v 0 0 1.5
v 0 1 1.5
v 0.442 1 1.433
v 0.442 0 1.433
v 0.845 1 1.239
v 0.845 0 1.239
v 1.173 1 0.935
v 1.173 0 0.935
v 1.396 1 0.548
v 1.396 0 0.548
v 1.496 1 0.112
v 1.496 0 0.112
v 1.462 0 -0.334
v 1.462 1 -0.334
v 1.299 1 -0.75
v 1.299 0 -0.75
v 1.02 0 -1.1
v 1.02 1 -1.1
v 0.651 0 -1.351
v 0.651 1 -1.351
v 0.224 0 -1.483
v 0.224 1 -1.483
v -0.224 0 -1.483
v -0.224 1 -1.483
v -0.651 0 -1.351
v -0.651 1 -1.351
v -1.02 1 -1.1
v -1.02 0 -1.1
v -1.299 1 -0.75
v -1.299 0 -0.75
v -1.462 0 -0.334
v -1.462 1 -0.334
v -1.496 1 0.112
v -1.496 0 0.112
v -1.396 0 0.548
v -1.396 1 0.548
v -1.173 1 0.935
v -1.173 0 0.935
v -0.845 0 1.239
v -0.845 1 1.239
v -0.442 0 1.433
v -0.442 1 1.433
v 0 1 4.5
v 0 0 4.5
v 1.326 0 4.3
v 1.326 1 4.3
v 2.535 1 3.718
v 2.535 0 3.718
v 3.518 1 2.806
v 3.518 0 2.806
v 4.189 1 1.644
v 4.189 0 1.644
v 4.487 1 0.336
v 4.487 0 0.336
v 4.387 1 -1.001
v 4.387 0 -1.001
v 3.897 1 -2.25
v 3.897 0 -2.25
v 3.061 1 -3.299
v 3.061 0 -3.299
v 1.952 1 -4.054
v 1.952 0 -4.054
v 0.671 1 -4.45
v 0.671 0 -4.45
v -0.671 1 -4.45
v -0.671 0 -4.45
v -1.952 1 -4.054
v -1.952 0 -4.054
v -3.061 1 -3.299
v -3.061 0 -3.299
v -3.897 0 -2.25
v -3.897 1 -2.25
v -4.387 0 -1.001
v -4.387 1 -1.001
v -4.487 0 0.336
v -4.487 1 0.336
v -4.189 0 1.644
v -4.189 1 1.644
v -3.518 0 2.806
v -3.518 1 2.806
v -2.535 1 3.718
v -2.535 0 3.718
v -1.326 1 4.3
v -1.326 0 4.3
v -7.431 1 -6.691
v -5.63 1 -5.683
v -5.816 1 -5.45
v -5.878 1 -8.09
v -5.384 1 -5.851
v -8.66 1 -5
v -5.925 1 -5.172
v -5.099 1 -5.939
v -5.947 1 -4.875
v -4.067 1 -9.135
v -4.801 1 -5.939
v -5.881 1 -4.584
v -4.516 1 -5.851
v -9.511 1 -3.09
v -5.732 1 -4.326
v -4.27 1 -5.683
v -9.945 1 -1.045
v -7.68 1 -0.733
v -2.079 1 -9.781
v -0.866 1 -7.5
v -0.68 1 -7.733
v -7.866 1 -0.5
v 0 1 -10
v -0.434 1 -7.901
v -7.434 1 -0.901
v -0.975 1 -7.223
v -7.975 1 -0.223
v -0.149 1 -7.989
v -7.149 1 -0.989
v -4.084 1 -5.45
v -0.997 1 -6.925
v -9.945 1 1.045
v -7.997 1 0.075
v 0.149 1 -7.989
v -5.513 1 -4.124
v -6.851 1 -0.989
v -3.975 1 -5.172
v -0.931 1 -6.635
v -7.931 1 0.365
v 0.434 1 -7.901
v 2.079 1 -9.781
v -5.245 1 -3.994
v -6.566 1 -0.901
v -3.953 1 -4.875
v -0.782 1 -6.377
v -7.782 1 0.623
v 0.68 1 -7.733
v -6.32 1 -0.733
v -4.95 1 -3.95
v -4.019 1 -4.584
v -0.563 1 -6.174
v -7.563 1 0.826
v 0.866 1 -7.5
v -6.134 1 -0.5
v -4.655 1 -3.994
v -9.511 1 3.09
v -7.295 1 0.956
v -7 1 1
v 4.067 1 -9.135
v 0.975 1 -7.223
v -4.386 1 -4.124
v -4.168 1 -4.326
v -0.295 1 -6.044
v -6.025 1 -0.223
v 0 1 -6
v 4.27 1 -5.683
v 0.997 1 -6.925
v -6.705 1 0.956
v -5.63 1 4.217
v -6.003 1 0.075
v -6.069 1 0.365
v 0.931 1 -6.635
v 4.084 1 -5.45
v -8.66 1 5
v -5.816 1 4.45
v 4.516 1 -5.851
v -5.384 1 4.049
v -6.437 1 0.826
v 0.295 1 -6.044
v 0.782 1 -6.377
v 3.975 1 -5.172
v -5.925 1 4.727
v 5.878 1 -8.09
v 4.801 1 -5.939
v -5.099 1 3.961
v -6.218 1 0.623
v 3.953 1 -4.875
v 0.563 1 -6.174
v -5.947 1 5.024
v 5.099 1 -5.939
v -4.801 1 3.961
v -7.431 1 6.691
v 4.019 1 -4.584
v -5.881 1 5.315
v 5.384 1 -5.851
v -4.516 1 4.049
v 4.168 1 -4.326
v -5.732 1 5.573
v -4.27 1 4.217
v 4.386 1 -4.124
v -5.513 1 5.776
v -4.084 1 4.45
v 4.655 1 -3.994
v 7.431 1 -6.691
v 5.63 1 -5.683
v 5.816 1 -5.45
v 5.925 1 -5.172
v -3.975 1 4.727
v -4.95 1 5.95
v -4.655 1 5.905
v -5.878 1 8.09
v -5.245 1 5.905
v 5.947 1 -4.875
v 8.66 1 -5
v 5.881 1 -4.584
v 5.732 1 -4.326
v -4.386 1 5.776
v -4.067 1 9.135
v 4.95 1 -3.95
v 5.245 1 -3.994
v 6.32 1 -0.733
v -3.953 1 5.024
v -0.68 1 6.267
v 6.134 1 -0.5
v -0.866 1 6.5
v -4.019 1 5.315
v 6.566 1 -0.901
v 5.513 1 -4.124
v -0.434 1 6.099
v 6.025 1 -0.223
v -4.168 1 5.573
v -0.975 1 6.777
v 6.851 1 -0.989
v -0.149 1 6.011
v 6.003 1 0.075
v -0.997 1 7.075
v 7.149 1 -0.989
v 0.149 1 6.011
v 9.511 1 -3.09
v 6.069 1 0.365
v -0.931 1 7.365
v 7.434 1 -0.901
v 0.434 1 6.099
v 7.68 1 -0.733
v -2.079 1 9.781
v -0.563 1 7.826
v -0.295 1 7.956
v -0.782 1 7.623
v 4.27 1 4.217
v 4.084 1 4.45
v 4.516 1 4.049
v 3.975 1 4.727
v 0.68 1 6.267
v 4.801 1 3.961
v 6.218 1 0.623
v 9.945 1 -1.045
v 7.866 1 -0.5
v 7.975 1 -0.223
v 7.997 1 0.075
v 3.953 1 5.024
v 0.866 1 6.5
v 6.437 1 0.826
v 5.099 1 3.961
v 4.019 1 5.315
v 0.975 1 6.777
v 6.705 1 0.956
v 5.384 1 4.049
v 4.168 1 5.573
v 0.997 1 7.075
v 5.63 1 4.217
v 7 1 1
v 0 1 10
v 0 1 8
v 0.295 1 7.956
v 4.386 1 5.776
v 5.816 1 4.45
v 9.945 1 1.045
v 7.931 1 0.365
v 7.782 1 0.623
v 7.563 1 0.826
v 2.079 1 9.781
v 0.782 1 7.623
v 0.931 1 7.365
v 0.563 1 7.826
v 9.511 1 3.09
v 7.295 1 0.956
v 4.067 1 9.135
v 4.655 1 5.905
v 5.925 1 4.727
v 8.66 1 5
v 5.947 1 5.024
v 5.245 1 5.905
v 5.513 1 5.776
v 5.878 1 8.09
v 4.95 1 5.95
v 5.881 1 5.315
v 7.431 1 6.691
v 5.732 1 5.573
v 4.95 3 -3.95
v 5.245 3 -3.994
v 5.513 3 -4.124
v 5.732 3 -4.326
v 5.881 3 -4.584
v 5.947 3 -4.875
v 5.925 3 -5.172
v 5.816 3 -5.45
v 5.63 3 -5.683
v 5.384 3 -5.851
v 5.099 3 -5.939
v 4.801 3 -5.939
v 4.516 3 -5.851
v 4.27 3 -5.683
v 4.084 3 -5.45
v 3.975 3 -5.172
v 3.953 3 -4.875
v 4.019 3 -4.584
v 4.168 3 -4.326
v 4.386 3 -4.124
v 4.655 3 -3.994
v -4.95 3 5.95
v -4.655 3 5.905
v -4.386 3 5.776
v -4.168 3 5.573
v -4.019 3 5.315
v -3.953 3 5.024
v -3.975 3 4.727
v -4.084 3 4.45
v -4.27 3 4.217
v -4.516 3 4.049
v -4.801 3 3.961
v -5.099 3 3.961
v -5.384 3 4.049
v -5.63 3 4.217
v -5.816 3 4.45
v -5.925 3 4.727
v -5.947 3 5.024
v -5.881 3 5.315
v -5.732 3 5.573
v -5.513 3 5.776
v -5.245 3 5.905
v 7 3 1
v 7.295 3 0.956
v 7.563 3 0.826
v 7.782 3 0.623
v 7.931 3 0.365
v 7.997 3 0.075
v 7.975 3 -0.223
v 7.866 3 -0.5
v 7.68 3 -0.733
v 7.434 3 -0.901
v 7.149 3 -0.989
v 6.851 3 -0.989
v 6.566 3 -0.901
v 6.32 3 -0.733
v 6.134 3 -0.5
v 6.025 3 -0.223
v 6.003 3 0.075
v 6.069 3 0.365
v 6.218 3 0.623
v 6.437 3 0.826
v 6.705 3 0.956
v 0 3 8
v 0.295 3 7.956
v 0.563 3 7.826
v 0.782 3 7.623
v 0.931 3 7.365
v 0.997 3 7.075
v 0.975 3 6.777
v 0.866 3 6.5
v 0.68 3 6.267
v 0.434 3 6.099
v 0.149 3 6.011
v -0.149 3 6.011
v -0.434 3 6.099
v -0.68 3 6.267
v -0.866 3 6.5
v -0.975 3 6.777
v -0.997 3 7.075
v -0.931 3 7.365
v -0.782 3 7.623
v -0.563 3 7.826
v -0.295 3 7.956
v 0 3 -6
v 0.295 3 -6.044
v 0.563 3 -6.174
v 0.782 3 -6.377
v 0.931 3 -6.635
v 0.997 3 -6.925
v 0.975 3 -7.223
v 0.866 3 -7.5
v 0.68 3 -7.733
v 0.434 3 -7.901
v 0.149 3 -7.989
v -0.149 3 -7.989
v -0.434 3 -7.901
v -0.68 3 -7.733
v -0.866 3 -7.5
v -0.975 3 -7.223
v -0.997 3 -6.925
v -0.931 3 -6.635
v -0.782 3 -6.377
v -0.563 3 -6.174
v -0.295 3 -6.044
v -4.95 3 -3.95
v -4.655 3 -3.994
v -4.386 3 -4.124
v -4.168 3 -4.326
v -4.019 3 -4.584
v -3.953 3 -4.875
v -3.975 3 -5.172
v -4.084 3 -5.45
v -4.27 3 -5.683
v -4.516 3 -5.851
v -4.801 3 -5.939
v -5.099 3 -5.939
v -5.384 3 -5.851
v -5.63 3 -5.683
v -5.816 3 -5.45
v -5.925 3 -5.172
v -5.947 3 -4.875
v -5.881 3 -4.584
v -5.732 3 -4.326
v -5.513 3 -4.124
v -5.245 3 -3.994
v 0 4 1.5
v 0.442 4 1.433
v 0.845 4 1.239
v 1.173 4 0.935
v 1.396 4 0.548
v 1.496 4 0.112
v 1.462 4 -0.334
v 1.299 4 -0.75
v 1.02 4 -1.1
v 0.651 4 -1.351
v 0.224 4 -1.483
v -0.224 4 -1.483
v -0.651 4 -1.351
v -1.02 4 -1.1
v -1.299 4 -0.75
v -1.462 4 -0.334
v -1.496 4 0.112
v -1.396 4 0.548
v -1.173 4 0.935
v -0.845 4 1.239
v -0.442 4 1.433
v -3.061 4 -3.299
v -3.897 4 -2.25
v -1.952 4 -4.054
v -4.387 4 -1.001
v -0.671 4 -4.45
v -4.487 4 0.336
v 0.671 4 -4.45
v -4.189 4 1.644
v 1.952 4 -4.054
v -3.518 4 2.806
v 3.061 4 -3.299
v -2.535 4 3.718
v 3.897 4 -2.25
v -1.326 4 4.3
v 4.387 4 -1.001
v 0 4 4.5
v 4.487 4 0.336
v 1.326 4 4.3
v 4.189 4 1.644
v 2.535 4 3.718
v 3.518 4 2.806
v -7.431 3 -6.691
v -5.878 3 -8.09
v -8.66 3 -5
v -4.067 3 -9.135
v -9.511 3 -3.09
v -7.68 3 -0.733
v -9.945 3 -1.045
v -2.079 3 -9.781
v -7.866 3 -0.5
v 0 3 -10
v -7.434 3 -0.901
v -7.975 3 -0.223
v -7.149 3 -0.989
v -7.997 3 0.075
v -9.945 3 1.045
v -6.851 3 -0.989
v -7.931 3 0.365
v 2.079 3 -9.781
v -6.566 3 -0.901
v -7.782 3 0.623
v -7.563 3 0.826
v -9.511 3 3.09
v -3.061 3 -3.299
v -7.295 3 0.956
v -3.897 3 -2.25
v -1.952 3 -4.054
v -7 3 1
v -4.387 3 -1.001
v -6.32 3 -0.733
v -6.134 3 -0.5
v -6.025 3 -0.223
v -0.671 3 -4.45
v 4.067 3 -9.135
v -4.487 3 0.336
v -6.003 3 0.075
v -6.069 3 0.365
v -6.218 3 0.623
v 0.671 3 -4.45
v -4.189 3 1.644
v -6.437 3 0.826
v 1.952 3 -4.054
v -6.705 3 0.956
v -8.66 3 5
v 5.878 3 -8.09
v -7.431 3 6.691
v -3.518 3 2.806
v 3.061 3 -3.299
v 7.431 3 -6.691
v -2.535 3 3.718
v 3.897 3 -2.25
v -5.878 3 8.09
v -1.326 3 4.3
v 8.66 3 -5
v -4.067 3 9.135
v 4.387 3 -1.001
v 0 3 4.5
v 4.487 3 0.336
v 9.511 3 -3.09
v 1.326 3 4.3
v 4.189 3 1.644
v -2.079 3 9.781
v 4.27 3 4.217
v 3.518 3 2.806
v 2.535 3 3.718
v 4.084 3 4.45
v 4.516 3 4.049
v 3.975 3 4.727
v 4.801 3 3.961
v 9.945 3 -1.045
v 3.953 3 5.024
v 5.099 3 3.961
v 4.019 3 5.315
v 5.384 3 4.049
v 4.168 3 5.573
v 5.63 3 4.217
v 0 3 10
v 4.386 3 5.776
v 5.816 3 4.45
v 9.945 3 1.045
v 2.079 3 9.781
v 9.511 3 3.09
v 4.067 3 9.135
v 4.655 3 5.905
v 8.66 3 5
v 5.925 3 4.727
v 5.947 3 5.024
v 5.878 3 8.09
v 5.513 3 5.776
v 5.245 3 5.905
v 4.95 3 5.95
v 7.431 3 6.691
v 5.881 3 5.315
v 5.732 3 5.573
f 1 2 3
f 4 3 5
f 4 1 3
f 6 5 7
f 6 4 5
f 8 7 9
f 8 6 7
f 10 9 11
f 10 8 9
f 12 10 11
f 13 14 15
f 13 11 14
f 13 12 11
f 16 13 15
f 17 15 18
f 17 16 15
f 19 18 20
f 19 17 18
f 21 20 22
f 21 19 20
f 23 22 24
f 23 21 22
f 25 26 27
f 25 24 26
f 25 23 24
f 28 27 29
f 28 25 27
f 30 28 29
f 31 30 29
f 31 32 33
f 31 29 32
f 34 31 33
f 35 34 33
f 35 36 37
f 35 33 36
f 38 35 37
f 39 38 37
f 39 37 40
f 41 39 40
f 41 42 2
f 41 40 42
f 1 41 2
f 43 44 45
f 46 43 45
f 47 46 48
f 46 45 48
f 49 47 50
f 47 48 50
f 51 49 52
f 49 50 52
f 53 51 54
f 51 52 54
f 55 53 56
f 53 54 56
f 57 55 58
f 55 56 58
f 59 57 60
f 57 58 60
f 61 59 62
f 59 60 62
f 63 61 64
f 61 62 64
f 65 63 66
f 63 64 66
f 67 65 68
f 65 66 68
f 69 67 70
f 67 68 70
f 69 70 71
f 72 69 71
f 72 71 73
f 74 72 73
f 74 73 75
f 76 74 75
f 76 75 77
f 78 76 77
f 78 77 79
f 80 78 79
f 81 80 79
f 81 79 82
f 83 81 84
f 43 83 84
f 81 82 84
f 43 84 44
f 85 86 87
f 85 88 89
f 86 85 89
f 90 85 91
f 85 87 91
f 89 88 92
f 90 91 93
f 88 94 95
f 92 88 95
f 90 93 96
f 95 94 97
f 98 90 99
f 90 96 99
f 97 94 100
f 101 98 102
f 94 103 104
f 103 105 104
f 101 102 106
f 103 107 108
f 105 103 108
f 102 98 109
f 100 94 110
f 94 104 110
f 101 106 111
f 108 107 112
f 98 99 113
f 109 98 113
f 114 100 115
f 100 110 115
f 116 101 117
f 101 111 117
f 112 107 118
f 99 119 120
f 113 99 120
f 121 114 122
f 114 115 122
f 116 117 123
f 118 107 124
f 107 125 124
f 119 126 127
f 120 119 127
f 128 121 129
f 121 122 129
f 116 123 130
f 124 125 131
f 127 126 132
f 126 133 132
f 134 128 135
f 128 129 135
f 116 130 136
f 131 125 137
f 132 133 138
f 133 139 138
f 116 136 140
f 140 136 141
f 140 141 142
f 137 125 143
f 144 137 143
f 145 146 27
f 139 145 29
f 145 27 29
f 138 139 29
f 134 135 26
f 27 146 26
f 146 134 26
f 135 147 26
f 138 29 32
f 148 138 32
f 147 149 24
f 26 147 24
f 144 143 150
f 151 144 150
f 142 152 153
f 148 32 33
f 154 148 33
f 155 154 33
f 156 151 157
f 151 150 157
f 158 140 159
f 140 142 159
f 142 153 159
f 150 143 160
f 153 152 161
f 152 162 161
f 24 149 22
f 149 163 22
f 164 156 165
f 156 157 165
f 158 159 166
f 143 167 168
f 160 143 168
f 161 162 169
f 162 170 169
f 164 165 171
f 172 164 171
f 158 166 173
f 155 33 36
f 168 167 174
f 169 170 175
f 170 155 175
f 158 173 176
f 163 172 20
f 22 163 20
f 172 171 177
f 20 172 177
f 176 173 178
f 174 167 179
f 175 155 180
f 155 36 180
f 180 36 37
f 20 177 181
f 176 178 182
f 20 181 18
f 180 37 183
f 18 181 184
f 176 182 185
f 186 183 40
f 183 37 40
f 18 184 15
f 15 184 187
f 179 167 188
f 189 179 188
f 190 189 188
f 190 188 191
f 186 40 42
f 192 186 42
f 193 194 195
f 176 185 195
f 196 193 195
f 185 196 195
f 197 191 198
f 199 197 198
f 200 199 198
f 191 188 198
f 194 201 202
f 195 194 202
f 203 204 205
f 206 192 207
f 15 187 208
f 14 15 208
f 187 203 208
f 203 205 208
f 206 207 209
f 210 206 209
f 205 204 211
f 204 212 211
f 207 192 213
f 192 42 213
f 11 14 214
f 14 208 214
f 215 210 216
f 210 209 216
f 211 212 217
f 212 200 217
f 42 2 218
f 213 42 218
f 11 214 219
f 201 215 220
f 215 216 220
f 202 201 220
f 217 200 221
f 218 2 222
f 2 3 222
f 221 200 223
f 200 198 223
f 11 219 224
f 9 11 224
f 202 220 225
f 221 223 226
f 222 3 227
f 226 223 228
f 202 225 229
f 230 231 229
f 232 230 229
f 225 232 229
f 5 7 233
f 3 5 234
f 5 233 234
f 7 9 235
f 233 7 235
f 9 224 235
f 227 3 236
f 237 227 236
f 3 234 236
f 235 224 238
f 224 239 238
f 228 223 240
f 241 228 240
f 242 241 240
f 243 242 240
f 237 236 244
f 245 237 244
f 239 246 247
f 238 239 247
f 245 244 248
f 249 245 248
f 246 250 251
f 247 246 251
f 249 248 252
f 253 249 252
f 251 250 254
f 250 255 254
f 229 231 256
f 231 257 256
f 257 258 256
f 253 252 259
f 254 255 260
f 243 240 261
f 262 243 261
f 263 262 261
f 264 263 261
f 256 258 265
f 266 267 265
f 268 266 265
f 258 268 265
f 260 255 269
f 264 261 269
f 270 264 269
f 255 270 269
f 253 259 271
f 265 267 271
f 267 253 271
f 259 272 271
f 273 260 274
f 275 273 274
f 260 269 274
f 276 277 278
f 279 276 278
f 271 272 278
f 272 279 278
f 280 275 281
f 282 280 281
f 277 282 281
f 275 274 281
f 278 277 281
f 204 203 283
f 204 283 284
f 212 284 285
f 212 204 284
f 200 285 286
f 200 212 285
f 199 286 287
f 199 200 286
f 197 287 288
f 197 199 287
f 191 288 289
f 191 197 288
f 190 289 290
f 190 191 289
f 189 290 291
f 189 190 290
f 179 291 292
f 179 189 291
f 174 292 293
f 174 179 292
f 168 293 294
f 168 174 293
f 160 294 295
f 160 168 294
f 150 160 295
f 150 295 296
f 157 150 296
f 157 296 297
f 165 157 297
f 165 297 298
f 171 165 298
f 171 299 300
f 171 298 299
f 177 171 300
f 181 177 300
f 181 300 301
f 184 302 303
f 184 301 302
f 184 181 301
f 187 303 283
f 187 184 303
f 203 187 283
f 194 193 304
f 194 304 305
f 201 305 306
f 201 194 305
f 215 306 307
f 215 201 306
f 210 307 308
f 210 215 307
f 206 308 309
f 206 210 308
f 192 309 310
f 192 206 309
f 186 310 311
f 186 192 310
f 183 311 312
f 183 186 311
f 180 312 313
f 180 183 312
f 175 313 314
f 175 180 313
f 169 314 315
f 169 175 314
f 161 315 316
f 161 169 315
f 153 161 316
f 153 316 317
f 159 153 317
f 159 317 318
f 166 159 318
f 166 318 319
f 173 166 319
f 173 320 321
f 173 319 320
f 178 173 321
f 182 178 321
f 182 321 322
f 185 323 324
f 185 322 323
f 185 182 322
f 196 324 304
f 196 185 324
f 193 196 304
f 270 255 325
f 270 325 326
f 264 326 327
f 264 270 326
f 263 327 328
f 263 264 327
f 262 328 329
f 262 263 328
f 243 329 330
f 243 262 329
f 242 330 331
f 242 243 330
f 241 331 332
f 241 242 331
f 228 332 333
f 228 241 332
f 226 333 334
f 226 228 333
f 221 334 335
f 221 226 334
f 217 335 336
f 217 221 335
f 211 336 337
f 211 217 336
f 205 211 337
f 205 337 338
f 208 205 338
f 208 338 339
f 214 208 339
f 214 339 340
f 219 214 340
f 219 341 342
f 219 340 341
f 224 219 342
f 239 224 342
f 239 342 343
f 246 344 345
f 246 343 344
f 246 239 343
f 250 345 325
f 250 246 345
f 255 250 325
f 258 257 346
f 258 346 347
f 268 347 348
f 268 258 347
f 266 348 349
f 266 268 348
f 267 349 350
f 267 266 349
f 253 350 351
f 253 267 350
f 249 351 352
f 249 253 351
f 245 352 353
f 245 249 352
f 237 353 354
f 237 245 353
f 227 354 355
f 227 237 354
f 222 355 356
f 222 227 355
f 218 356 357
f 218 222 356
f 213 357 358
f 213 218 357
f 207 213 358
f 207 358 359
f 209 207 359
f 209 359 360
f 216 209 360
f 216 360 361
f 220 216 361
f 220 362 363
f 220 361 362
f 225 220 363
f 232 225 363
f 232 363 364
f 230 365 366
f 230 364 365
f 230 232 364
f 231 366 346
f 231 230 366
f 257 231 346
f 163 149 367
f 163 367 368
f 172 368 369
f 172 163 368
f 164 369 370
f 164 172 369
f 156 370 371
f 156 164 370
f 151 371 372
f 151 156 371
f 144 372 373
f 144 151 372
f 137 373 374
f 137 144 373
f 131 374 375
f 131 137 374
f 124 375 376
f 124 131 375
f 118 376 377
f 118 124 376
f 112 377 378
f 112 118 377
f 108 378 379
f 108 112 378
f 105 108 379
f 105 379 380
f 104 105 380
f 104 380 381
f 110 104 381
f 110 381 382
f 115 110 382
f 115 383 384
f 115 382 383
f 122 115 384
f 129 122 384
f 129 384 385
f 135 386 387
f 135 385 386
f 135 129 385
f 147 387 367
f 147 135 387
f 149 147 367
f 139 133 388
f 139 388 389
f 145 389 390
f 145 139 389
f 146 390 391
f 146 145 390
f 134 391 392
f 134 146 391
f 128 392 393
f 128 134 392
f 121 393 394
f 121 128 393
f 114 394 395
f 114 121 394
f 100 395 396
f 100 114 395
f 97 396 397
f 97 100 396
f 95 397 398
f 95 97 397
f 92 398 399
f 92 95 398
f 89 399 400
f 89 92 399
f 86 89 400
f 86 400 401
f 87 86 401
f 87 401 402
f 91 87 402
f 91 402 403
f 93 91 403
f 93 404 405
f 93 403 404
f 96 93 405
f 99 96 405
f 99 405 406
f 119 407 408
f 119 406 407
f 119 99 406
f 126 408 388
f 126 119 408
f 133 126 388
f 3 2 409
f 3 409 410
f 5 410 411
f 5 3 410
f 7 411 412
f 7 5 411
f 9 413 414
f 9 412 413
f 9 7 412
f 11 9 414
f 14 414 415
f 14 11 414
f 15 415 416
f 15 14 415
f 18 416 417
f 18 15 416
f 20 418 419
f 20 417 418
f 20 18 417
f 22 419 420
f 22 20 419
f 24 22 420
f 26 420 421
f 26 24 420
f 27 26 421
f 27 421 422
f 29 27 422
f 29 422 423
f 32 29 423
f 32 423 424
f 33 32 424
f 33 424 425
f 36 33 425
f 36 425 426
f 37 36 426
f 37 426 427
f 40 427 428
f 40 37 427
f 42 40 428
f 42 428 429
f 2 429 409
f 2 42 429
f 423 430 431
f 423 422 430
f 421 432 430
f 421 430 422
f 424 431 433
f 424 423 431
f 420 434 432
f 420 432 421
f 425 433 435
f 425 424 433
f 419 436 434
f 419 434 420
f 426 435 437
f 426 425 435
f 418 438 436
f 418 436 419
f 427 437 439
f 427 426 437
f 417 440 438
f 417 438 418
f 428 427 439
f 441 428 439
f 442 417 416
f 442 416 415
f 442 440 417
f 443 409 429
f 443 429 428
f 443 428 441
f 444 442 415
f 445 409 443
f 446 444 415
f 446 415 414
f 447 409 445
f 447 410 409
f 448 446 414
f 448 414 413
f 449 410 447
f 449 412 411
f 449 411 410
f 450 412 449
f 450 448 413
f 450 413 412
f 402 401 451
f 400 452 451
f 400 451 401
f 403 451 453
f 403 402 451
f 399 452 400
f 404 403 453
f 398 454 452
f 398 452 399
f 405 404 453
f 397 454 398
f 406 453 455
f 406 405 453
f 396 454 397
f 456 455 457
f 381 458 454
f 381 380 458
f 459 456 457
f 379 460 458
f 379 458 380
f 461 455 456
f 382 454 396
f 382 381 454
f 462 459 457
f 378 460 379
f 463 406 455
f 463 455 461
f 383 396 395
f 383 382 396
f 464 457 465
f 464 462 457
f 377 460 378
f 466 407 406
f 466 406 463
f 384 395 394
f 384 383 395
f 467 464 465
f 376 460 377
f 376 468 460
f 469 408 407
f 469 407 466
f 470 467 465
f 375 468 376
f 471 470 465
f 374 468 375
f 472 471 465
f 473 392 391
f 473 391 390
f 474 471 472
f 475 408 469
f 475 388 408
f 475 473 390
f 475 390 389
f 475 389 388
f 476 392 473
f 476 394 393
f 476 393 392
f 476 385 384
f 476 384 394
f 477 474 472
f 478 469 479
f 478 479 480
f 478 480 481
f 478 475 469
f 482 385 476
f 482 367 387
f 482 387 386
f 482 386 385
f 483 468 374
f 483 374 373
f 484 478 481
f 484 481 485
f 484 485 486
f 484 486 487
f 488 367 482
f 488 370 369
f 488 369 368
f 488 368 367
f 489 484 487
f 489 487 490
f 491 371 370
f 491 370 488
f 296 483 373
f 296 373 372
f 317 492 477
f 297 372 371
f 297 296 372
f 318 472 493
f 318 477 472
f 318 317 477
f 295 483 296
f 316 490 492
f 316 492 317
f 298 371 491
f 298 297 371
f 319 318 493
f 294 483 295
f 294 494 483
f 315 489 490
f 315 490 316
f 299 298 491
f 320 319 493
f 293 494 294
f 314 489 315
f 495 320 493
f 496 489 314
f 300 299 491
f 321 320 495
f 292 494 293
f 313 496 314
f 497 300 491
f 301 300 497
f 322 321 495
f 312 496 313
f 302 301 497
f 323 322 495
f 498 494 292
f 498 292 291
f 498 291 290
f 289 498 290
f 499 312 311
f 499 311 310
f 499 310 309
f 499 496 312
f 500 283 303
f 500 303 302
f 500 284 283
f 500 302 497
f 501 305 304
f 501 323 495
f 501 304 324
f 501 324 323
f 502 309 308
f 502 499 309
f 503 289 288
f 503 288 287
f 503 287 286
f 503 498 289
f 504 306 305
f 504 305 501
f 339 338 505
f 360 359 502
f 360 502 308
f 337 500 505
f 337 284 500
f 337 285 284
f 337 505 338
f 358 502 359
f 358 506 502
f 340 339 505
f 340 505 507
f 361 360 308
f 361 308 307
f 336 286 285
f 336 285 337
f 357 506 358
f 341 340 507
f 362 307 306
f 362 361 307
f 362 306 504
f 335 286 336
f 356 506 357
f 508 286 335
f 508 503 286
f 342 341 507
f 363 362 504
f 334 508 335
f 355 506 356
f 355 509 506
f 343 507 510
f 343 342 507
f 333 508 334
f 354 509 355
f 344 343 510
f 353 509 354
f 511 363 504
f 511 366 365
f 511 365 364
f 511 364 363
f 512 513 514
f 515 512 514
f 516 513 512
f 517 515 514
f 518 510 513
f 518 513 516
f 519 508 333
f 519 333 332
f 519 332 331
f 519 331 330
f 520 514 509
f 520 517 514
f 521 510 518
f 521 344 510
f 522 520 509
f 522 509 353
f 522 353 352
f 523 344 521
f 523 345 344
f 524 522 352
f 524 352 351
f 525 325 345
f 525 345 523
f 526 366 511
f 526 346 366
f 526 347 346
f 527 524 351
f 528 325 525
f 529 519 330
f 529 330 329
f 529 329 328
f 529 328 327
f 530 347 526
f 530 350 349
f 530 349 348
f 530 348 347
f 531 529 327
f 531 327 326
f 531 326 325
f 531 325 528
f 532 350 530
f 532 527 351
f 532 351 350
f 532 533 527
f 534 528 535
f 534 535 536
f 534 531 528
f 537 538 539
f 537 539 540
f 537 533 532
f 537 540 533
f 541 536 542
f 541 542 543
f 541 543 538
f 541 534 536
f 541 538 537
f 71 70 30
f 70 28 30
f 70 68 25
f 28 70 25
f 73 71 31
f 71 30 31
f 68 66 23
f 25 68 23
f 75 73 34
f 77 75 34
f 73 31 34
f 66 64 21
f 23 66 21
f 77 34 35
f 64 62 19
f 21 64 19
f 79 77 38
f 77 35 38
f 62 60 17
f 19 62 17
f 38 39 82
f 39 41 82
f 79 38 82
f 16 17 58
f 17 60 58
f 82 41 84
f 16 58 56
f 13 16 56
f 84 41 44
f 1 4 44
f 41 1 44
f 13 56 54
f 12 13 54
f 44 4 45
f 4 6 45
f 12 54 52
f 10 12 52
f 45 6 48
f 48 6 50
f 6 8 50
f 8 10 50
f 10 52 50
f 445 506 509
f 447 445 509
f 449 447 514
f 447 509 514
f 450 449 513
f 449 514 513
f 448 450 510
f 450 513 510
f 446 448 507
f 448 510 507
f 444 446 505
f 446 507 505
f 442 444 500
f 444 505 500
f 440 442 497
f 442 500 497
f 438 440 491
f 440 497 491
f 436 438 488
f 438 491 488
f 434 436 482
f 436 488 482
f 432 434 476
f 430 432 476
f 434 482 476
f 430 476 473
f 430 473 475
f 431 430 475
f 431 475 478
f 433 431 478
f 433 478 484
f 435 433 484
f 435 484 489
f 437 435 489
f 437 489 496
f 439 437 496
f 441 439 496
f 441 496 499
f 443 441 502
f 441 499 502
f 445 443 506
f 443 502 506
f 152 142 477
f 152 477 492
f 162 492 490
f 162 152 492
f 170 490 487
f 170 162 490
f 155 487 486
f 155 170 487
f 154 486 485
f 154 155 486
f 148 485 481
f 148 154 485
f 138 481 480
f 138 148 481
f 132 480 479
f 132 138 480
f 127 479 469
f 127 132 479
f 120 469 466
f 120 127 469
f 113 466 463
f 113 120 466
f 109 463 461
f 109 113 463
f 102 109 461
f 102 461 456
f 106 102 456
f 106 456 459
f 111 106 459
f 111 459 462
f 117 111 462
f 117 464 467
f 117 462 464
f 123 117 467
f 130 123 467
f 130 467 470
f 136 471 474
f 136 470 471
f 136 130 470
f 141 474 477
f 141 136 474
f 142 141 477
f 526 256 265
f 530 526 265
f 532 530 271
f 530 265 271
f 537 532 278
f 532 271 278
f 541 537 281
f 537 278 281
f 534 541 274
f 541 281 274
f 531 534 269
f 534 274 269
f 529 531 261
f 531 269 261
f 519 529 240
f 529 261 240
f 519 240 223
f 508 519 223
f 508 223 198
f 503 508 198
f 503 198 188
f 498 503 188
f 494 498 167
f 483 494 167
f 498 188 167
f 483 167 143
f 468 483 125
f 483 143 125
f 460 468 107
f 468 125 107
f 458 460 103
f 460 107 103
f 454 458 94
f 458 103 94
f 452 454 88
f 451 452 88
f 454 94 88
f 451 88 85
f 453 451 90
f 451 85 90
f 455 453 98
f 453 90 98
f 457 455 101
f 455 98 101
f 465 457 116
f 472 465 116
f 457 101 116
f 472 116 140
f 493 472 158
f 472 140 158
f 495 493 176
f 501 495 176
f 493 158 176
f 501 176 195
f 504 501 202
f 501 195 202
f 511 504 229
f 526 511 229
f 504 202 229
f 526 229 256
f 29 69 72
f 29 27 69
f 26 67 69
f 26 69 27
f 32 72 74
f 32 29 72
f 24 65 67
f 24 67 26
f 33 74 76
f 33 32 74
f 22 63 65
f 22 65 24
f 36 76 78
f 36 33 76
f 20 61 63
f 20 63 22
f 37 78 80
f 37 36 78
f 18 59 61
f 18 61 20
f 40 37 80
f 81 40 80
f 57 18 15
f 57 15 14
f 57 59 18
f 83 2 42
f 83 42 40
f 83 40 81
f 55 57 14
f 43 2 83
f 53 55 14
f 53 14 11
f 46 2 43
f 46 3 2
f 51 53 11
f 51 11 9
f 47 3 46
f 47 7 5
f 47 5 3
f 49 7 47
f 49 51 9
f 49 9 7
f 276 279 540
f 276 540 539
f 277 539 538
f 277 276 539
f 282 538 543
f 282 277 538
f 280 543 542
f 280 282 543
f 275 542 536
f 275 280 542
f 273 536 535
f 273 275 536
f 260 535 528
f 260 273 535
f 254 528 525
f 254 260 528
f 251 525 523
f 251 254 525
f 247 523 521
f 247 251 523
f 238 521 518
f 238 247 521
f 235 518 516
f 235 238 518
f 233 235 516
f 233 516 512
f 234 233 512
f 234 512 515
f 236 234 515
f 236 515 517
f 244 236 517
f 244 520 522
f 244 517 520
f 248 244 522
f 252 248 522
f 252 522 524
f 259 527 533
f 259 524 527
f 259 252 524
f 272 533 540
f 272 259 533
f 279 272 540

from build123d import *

# Parameters (mm, degrees)
SKETCH_1_R          = 4.5
EXTRUDE_1_DEPTH     = 1
EXTRUDE_START       = 1
SKETCH_1_3_R        = 10
EXTRUDE_2_DEPTH     = 2
EXTRUDE_START_2     = 3
SKETCH_1_4_R        = 4.5
EXTRUDE_3_DEPTH     = 1
SKETCH_2_R          = 1.5
SKETCH_2_R_2        = 1
CUT_EXTRUDE_1_DEPTH = 15.696938457


with BuildPart() as part:
    # Эскиз1 → Бобышка-Вытянуть1 (new body)
    with BuildSketch(Plane(origin=(0, 0, 0), x_dir=(1, 0, 0), z_dir=(0, 1, 0))):
        Circle(SKETCH_1_R)
    extrude(amount=EXTRUDE_1_DEPTH)


with BuildPart() as body_2:
    # Эскиз1<3> → Бобышка-Вытянуть2 (new body)
    with BuildSketch(Plane(origin=(0, 0, 0), x_dir=(1, 0, 0), z_dir=(0, 1, 0)).offset(EXTRUDE_START)):
        Circle(SKETCH_1_3_R)
    extrude(amount=EXTRUDE_2_DEPTH)

    # Эскиз1<4> → Бобышка-Вытянуть3 (add)
    with BuildSketch(Plane(origin=(0, 0, 0), x_dir=(1, 0, 0), z_dir=(0, 1, 0)).offset(EXTRUDE_START_2)):
        Circle(SKETCH_1_4_R)
    extrude(amount=EXTRUDE_3_DEPTH)


with BuildPart() as cut_extrude_1_tool:
    # Эскиз2 → Вырез-Вытянуть1 (new, through all)
    with BuildSketch(Plane(origin=(0, 0, 0), x_dir=(1, 0, 0), z_dir=(0, 1, 0))):
        Circle(SKETCH_2_R)
        with Locations((-7, 0)):
            Circle(SKETCH_2_R_2)
        with Locations((-4.949747468, 4.949747468)):
            Circle(SKETCH_2_R_2)
        with Locations((0, 7)):
            Circle(SKETCH_2_R_2)
        with Locations((4.949747468, 4.949747468)):
            Circle(SKETCH_2_R_2)
        with Locations((7, 0)):
            Circle(SKETCH_2_R_2)
        with Locations((4.949747468, -4.949747468)):
            Circle(SKETCH_2_R_2)
        with Locations((0, -7)):
            Circle(SKETCH_2_R_2)
        with Locations((-4.949747468, -4.949747468)):
            Circle(SKETCH_2_R_2)
    extrude(amount=CUT_EXTRUDE_1_DEPTH)


with BuildPart() as part_1:
    add(part.part)

    # Вырез-Вытянуть1: cut by cut_extrude_1_tool
    add(cut_extrude_1_tool.part, mode=Mode.SUBTRACT)


with BuildPart() as body_2_1:
    add(body_2.part)

    # Вырез-Вытянуть1: cut by cut_extrude_1_tool
    add(cut_extrude_1_tool.part, mode=Mode.SUBTRACT)


solid = Compound([part_1.part, body_2_1.part])
